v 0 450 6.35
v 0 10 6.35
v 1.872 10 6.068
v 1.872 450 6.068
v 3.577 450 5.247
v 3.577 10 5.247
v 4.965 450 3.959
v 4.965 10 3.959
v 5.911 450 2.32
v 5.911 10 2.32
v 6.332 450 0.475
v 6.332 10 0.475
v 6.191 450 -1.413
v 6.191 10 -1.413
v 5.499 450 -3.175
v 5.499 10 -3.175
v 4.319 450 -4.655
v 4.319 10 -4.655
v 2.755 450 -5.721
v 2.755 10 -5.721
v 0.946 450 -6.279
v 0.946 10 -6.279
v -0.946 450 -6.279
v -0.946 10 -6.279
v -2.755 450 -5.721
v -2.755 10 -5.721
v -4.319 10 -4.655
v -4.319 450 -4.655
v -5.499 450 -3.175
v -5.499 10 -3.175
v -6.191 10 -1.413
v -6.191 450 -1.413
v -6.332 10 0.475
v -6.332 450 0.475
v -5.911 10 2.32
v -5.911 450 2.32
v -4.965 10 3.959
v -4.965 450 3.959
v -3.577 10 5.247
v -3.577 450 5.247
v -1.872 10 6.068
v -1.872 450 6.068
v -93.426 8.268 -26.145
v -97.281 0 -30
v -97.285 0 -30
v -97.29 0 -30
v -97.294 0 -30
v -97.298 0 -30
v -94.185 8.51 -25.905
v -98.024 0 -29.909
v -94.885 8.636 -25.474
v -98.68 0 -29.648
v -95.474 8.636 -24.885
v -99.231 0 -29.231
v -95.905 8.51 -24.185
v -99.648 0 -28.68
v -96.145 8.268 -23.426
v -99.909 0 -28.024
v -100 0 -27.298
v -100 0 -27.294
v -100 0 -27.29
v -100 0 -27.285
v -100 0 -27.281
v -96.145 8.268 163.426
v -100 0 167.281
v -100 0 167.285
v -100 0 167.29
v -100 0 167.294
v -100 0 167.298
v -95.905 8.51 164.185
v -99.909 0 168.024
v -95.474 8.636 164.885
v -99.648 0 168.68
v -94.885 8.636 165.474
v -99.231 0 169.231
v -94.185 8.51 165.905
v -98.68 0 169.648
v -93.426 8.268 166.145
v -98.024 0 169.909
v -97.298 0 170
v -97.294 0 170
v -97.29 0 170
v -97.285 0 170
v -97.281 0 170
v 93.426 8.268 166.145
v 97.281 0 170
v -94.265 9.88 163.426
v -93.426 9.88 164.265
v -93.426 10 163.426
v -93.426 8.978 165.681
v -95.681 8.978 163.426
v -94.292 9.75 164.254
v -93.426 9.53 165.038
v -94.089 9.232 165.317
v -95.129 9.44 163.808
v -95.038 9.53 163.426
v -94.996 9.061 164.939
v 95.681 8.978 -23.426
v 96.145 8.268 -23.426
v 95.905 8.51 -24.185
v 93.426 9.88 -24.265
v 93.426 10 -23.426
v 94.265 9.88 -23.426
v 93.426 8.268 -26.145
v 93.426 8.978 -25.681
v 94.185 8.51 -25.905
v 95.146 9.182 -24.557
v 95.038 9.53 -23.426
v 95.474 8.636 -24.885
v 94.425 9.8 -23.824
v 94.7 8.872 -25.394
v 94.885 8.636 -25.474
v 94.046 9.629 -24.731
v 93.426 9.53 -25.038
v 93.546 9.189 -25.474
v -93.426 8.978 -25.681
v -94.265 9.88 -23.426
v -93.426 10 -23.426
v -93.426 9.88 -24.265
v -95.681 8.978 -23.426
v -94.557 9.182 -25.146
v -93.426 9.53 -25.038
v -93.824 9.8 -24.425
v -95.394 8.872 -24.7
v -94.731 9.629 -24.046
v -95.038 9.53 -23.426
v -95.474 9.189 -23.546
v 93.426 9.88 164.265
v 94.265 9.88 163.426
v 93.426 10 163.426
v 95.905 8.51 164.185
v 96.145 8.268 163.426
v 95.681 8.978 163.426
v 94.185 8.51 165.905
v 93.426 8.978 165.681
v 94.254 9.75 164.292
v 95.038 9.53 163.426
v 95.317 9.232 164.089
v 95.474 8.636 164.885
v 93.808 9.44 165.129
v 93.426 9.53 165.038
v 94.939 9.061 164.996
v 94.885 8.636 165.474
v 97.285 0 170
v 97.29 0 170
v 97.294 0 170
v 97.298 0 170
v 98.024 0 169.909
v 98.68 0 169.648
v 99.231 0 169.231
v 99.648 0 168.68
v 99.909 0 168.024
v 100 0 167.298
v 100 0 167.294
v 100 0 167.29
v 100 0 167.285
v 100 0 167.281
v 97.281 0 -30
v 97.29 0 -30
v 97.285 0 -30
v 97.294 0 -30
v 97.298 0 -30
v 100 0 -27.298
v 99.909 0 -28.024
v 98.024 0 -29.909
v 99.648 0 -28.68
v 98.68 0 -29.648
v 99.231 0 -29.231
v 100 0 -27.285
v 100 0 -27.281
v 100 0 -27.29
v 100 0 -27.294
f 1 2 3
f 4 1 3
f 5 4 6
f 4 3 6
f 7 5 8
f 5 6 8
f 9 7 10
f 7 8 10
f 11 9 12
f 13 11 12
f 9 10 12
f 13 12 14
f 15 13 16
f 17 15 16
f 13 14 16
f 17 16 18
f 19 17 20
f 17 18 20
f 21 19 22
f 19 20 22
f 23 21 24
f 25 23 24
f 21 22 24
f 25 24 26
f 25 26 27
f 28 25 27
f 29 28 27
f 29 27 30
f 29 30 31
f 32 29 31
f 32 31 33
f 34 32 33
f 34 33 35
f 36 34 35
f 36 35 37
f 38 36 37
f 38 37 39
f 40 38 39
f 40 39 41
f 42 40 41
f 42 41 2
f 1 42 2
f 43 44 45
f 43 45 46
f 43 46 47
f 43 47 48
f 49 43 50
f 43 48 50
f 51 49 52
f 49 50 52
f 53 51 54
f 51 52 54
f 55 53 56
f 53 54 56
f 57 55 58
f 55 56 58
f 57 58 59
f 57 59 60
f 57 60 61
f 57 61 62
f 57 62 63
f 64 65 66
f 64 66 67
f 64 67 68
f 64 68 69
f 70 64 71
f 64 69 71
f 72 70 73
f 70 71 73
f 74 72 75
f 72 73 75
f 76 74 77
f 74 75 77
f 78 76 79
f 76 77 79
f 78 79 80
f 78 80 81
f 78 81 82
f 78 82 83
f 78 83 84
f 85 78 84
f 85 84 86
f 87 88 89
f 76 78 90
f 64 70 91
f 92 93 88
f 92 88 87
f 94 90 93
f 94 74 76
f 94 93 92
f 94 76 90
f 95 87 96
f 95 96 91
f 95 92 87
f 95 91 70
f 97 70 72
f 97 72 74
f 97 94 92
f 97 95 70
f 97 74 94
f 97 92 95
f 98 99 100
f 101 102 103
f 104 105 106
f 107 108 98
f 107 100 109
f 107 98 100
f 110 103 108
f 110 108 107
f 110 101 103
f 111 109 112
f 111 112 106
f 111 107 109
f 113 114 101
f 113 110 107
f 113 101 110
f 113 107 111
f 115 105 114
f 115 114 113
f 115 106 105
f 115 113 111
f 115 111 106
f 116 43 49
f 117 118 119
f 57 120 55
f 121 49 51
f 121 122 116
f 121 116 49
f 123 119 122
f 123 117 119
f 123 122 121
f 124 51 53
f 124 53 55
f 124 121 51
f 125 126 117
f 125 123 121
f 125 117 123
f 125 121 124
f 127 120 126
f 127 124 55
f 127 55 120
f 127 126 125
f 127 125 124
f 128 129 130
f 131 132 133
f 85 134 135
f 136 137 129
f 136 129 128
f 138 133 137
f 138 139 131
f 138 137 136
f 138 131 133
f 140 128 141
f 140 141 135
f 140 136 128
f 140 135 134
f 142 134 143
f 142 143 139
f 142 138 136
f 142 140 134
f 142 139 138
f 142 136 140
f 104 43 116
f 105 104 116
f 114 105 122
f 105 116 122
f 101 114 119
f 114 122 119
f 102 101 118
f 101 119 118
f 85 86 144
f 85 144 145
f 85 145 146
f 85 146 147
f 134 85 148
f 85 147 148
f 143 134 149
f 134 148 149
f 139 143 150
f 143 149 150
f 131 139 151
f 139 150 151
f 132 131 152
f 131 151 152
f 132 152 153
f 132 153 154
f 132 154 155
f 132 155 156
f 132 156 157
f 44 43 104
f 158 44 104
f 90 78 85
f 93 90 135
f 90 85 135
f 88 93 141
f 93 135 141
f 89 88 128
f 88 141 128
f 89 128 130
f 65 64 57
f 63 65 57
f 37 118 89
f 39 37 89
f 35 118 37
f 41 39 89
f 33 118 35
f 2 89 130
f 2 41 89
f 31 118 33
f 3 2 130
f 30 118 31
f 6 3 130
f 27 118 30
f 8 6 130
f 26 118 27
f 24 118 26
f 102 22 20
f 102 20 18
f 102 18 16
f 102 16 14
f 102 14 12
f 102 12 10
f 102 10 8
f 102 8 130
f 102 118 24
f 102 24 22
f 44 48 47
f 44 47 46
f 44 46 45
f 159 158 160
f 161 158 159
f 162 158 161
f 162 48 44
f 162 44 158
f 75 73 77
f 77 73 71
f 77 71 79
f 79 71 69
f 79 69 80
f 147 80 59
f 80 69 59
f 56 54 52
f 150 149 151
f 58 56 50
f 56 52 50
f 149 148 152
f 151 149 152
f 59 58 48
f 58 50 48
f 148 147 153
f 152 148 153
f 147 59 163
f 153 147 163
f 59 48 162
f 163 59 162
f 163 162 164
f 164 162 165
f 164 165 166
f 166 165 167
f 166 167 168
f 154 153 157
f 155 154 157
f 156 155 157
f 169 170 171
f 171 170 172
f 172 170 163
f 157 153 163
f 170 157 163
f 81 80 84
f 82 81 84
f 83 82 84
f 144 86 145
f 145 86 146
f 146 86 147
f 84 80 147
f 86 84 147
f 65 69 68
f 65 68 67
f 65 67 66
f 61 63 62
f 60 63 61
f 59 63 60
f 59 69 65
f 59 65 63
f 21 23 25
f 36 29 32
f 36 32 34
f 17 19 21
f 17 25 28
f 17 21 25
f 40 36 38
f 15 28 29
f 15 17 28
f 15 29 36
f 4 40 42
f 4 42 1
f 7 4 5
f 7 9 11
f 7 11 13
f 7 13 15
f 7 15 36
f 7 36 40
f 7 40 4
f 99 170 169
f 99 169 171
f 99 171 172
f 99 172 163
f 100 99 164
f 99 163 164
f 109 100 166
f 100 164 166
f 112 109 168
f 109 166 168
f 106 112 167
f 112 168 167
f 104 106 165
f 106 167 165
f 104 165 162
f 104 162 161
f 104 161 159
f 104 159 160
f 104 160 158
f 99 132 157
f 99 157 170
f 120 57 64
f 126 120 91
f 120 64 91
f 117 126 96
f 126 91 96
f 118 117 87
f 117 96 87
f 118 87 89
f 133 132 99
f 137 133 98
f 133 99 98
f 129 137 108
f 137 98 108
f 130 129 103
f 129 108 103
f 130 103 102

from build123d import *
from OCP.BRepFilletAPI import BRepFilletAPI_MakeChamfer

# Parameters (mm, degrees)
SKETCH1_R           = 6.35
BOSS_EXTRUDE1_DEPTH = 450
SKETCH2_W           = 200
SKETCH2_H           = 200
BOSS_EXTRUDE2_DEPTH = 10
CHAMFER1_SIZE       = 10
CHAMFER1_SIZE_2     = 4.663076582
FILLET1_R           = 3


# Some blends are built 0.0001 mm under size
with BuildPart() as part:
    # Sketch1 → Boss-Extrude1 (new body)
    with BuildSketch(Plane(origin=(0, 0, 0), x_dir=(1, 0, 0), z_dir=(0, 1, 0))):
        with Locations(Location((0, 0, 0), (0, 0, 270))):
            Circle(SKETCH1_R)
    extrude(amount=BOSS_EXTRUDE1_DEPTH)

    # Sketch2 → Boss-Extrude2 (add)
    with BuildSketch(Plane(origin=(0, 0, 0), x_dir=(1, 0, 0), z_dir=(0, 1, 0))):
        with Locations((0, -70)):
            Rectangle(SKETCH2_W, SKETCH2_H)
    extrude(amount=BOSS_EXTRUDE2_DEPTH)

    # Chamfer1
    chamfer1_edges_1 = [part.edges().sort_by_distance(p)[0] for p in [
        (-100, 10, 70),
    ]]
    chamfer1_side_1 = [part.faces().sort_by_distance(p)[0] for p in [
        (-100, 9.906738468, 70),
    ]]
    chamfer1_edges_2 = [part.edges().sort_by_distance(p)[0] for p in [
        (0, 10, -30),
    ]]
    chamfer1_side_2 = [part.faces().sort_by_distance(p)[0] for p in [
        (0, 9.906738468, -30),
    ]]
    chamfer1_edges_3 = [part.edges().sort_by_distance(p)[0] for p in [
        (100, 10, 70),
    ]]
    chamfer1_side_3 = [part.faces().sort_by_distance(p)[0] for p in [
        (100, 9.906738468, 70),
    ]]
    chamfer1_edges_4 = [part.edges().sort_by_distance(p)[0] for p in [
        (0, 10, 170),
    ]]
    chamfer1_side_4 = [part.faces().sort_by_distance(p)[0] for p in [
        (0, 9.906738468, 170),
    ]]
    chamfer1 = BRepFilletAPI_MakeChamfer(part.part.solid().wrapped)
    for e in chamfer1_edges_1:
        chamfer1.Add(CHAMFER1_SIZE - 0.0001, CHAMFER1_SIZE_2 - 0.0001, e.wrapped, chamfer1_side_1[0].wrapped)
    for e in chamfer1_edges_2:
        chamfer1.Add(CHAMFER1_SIZE - 0.0001, CHAMFER1_SIZE_2 - 0.0001, e.wrapped, chamfer1_side_2[0].wrapped)
    for e in chamfer1_edges_3:
        chamfer1.Add(CHAMFER1_SIZE - 0.0001, CHAMFER1_SIZE_2 - 0.0001, e.wrapped, chamfer1_side_3[0].wrapped)
    for e in chamfer1_edges_4:
        chamfer1.Add(CHAMFER1_SIZE - 0.0001, CHAMFER1_SIZE_2 - 0.0001, e.wrapped, chamfer1_side_4[0].wrapped)
    add(Compound.cast(chamfer1.Shape()), mode=Mode.REPLACE)  # a hair under: the kernel refuses the full size

    # Fillet1
    # the kernel refuses this fillet: 3 mm, written as the material it takes off along each edge
    with BuildSketch(Plane(origin=(93.425803391, 7, 163.425803391), x_dir=(0.8181037420217215, -0.5211920852493197, 0.24303307915492178), z_dir=(0.40339585418655427, 0.8213060146195212, 0.4033958541865531))) as fillet1_piece_1_section:
        Polygon((-4.845611884, -4.845611884), (4.845611884, -4.845611884), (4.845611884, 4.845611884), (-4.845611884, 4.845611884), align=None)
    fillet1_piece_1 = extrude(amount=4.845611884, mode=Mode.PRIVATE)
    fillet1_piece_1 = split(fillet1_piece_1, bisect_by=Plane(origin=(93.425803391, 7, 163.425803391), z_dir=(-0.3892785155895378, 0.834820025275396, -0.3892785155895367)), keep=Keep.TOP, mode=Mode.PRIVATE)
    fillet1_piece_1 = split(fillet1_piece_1, bisect_by=Plane(origin=(93.425803391, 7, 163.425803391), z_dir=(0, 0, 1)), keep=Keep.TOP, mode=Mode.PRIVATE)
    fillet1_piece_1 = split(fillet1_piece_1, bisect_by=Plane(origin=(93.425803391, 7, 163.425803391), z_dir=(1, 0, 0)), keep=Keep.TOP, mode=Mode.PRIVATE)
    fillet1_piece_1 = split(fillet1_piece_1, bisect_by=Plane(origin=(93.425803391, 8.267842866, 166.14473231), z_dir=(-2.562508249607615e-15, -0.42261428872649237, -0.9063096396729988)), keep=Keep.TOP, mode=Mode.PRIVATE)
    fillet1_piece_1 = split(fillet1_piece_1, bisect_by=Plane(origin=(96.14473231, 8.267842866, 163.425803391), z_dir=(-0.9063096396729988, -0.4226142887264923, 0)), keep=Keep.TOP, mode=Mode.PRIVATE)
    fillet1_piece_1 = split(fillet1_piece_1, bisect_by=Plane(origin=(93.425803391, 10, 163.425803391), z_dir=(0, -1, 0)), keep=Keep.TOP, mode=Mode.PRIVATE)
    fillet1_piece_1 = fillet1_piece_1 - Plane(origin=(93.425803391, 7, 163.425803391), x_dir=(-0.40339585418655427, -0.8213060146195212, -0.4033958541865531), z_dir=(0.8181037420217215, -0.5211920852493197, 0.24303307915492178)) * Sphere(FILLET1_R, mode=Mode.PRIVATE)
    add(fillet1_piece_1, mode=Mode.SUBTRACT)
    with BuildSketch(Plane(origin=(-93.425803391, 7, 163.425803391), x_dir=(-0.24303307915492378, -0.5211920852493191, 0.8181037420217212), z_dir=(-0.4033958541865524, 0.821306014619522, 0.4033958541865535))) as fillet1_piece_2_section:
        Polygon((-4.845611884, -4.845611884), (4.845611884, -4.845611884), (4.845611884, 4.845611884), (-4.845611884, 4.845611884), align=None)
    fillet1_piece_2 = extrude(amount=4.845611884, mode=Mode.PRIVATE)
    fillet1_piece_2 = split(fillet1_piece_2, bisect_by=Plane(origin=(-93.425803391, 7, 163.425803391), z_dir=(0.3892785155895374, 0.8348200252753952, -0.38927851558953863)), keep=Keep.TOP, mode=Mode.PRIVATE)
    fillet1_piece_2 = split(fillet1_piece_2, bisect_by=Plane(origin=(-93.425803391, 7, 163.425803391), z_dir=(-1, 0, 0)), keep=Keep.TOP, mode=Mode.PRIVATE)
    fillet1_piece_2 = split(fillet1_piece_2, bisect_by=Plane(origin=(-93.425803391, 7, 163.425803391), z_dir=(0, 0, 1)), keep=Keep.TOP, mode=Mode.PRIVATE)
    fillet1_piece_2 = split(fillet1_piece_2, bisect_by=Plane(origin=(-96.14473231, 8.267842866, 163.425803391), z_dir=(0.9063096396729988, -0.4226142887264923, 0)), keep=Keep.TOP, mode=Mode.PRIVATE)
    fillet1_piece_2 = split(fillet1_piece_2, bisect_by=Plane(origin=(-93.425803391, 8.267842866, 166.14473231), z_dir=(-2.562508249607615e-15, -0.42261428872649237, -0.9063096396729988)), keep=Keep.TOP, mode=Mode.PRIVATE)
    fillet1_piece_2 = split(fillet1_piece_2, bisect_by=Plane(origin=(-93.425803391, 10, 163.425803391), z_dir=(0, -1, 0)), keep=Keep.TOP, mode=Mode.PRIVATE)
    fillet1_piece_2 = fillet1_piece_2 - Plane(origin=(-93.425803391, 7, 163.425803391), x_dir=(0.4033958541865524, -0.821306014619522, -0.4033958541865535), z_dir=(-0.24303307915492378, -0.5211920852493191, 0.8181037420217212)) * Sphere(FILLET1_R, mode=Mode.PRIVATE)
    add(fillet1_piece_2, mode=Mode.SUBTRACT)
    with BuildSketch(Plane(origin=(93.425803391, 7, -23.425803391), x_dir=(-0.8181037420217211, 0.5211920852493194, 0.2430330791549239), z_dir=(0.4033958541865533, 0.8213060146195218, -0.4033958541865533))) as fillet1_piece_3_section:
        Polygon((-4.845611884, -4.845611884), (4.845611884, -4.845611884), (4.845611884, 4.845611884), (-4.845611884, 4.845611884), align=None)
    fillet1_piece_3 = extrude(amount=4.845611884, mode=Mode.PRIVATE)
    fillet1_piece_3 = split(fillet1_piece_3, bisect_by=Plane(origin=(93.425803391, 7, -23.425803391), z_dir=(-0.3892785155895376, 0.8348200252753957, 0.3892785155895376)), keep=Keep.TOP, mode=Mode.PRIVATE)
    fillet1_piece_3 = split(fillet1_piece_3, bisect_by=Plane(origin=(93.425803391, 7, -23.425803391), z_dir=(0, 0, -1)), keep=Keep.TOP, mode=Mode.PRIVATE)
    fillet1_piece_3 = split(fillet1_piece_3, bisect_by=Plane(origin=(93.425803391, 7, -23.425803391), z_dir=(1, 0, 0)), keep=Keep.TOP, mode=Mode.PRIVATE)
    fillet1_piece_3 = split(fillet1_piece_3, bisect_by=Plane(origin=(93.425803391, 8.267842866, -26.14473231), z_dir=(0, -0.4226142887264923, 0.9063096396729988)), keep=Keep.TOP, mode=Mode.PRIVATE)
    fillet1_piece_3 = split(fillet1_piece_3, bisect_by=Plane(origin=(96.14473231, 8.267842866, -23.425803391), z_dir=(-0.9063096396729988, -0.4226142887264923, 0)), keep=Keep.TOP, mode=Mode.PRIVATE)
    fillet1_piece_3 = split(fillet1_piece_3, bisect_by=Plane(origin=(93.425803391, 10, -23.425803391), z_dir=(0, -1, 0)), keep=Keep.TOP, mode=Mode.PRIVATE)
    fillet1_piece_3 = fillet1_piece_3 - Plane(origin=(93.425803391, 7, -23.425803391), x_dir=(-0.4033958541865533, -0.8213060146195218, 0.4033958541865533), z_dir=(-0.8181037420217211, 0.5211920852493194, 0.2430330791549239)) * Sphere(FILLET1_R, mode=Mode.PRIVATE)
    add(fillet1_piece_3, mode=Mode.SUBTRACT)
    with BuildSketch(Plane(origin=(-93.425803391, 7, -23.425803391), x_dir=(0.2430330791549239, 0.5211920852493194, 0.8181037420217211), z_dir=(-0.4033958541865533, 0.8213060146195218, -0.4033958541865533))) as fillet1_piece_4_section:
        Polygon((-4.845611884, -4.845611884), (4.845611884, -4.845611884), (4.845611884, 4.845611884), (-4.845611884, 4.845611884), align=None)
    fillet1_piece_4 = extrude(amount=4.845611884, mode=Mode.PRIVATE)
    fillet1_piece_4 = split(fillet1_piece_4, bisect_by=Plane(origin=(-93.425803391, 7, -23.425803391), z_dir=(0.3892785155895376, 0.8348200252753957, 0.3892785155895376)), keep=Keep.TOP, mode=Mode.PRIVATE)
    fillet1_piece_4 = split(fillet1_piece_4, bisect_by=Plane(origin=(-93.425803391, 7, -23.425803391), z_dir=(-1, 0, 0)), keep=Keep.TOP, mode=Mode.PRIVATE)
    fillet1_piece_4 = split(fillet1_piece_4, bisect_by=Plane(origin=(-93.425803391, 7, -23.425803391), z_dir=(0, 0, -1)), keep=Keep.TOP, mode=Mode.PRIVATE)
    fillet1_piece_4 = split(fillet1_piece_4, bisect_by=Plane(origin=(-96.14473231, 8.267842866, -23.425803391), z_dir=(0.9063096396729988, -0.4226142887264923, 0)), keep=Keep.TOP, mode=Mode.PRIVATE)
    fillet1_piece_4 = split(fillet1_piece_4, bisect_by=Plane(origin=(-93.425803391, 8.267842866, -26.14473231), z_dir=(0, -0.4226142887264923, 0.9063096396729988)), keep=Keep.TOP, mode=Mode.PRIVATE)
    fillet1_piece_4 = split(fillet1_piece_4, bisect_by=Plane(origin=(-93.425803391, 10, -23.425803391), z_dir=(0, -1, 0)), keep=Keep.TOP, mode=Mode.PRIVATE)
    fillet1_piece_4 = fillet1_piece_4 - Plane(origin=(-93.425803391, 7, -23.425803391), x_dir=(0.4033958541865533, -0.8213060146195218, 0.4033958541865533), z_dir=(0.2430330791549239, 0.5211920852493194, 0.8181037420217211)) * Sphere(FILLET1_R, mode=Mode.PRIVATE)
    add(fillet1_piece_4, mode=Mode.SUBTRACT)
    with BuildSketch(Plane(origin=(93.425803391, 10, 165.337023418), x_dir=(0, -0.9063096396729513, 0.4226142887265943), z_dir=(-1, 0, 0)), Plane(origin=(95.337023418, 10, -23.425803391), x_dir=(0.4226142887264939, -0.9063096396729982, 0), z_dir=(0, 0, 1))) as fillet1_piece_5:
        with BuildLine():
            CenterArc((FILLET1_R * 0.637073342265, -FILLET1_R), FILLET1_R, 90, 65.000251169)
            Line((-FILLET1_R * 0.269236297408, -FILLET1_R * 0.577385711273), (0, 0))
            Line((0, 0), (FILLET1_R * 0.637073342265, 0))
        make_face()
    extrude(amount=186.851606782, mode=Mode.SUBTRACT)
    with BuildSketch(Plane(origin=(-93.425803391, 10, -25.337023418), x_dir=(0, 0, 1), z_dir=(1, 0, 0)), Plane(origin=(-95.337023418, 10, 163.425803391), x_dir=(1, 0, 0), z_dir=(0, 0, -1))) as fillet1_piece_6:
        with BuildLine():
            CenterArc((FILLET1_R * 0.637073342265, FILLET1_R), FILLET1_R, 204.999748831, 65.000251169)
            Line((-FILLET1_R * 0.269236297408, FILLET1_R * 0.577385711274), (0, 0))
            Line((0, 0), (FILLET1_R * 0.637073342265, 0))
        make_face()
    extrude(amount=186.851606782, mode=Mode.SUBTRACT)
    with BuildSketch(Plane(origin=(102.437331252, -5.22683356, -32.437331252), x_dir=(0.16451466298238407, -0.3528068711963904, 0.9211200992815249), z_dir=(-0.3892785155895376, 0.8348200252753957, 0.3892785155895376)), Plane(origin=(102.437331252, -5.22683356, 172.437331252), x_dir=(-0.9211200992815247, -0.3528068711963899, 0.16451466298238568), z_dir=(-0.38927851558953774, 0.834820025275396, -0.3892785155895367))) as fillet1_piece_7:
        with BuildLine():
            CenterArc((FILLET1_R * 0.834820025275, -FILLET1_R), FILLET1_R, 90, 79.711610414)
            Line((-FILLET1_R * 0.149101224928, -FILLET1_R * 0.821397162964), (0, 0))
            Line((0, 0), (FILLET1_R * 0.834820025275, 0))
        make_face()
    extrude(amount=17.223193879, mode=Mode.SUBTRACT)
    with BuildSketch(Plane(origin=(-102.437331252, -5.22683356, -32.437331252), x_dir=(-0.16451466298237352, -0.35280687119639537, 0.9211200992815248), z_dir=(0.3892785155895376, 0.8348200252753957, 0.3892785155895376)), Plane(origin=(-102.437331252, -5.22683356, 172.437331252), x_dir=(0.9211200992815248, -0.35280687119640064, 0.16451466298236184), z_dir=(0.38927851558953747, 0.8348200252753953, -0.38927851558953863))) as fillet1_piece_8:
        with BuildLine():
            CenterArc((FILLET1_R * 0.834820025275, FILLET1_R), FILLET1_R, 190.288389586, 79.711610414)
            Line((-FILLET1_R * 0.149101224928, FILLET1_R * 0.821397162964), (0, 0))
            Line((0, 0), (FILLET1_R * 0.834820025275, 0))
        make_face()
    extrude(amount=17.223193879, mode=Mode.SUBTRACT)


solid = part.part
